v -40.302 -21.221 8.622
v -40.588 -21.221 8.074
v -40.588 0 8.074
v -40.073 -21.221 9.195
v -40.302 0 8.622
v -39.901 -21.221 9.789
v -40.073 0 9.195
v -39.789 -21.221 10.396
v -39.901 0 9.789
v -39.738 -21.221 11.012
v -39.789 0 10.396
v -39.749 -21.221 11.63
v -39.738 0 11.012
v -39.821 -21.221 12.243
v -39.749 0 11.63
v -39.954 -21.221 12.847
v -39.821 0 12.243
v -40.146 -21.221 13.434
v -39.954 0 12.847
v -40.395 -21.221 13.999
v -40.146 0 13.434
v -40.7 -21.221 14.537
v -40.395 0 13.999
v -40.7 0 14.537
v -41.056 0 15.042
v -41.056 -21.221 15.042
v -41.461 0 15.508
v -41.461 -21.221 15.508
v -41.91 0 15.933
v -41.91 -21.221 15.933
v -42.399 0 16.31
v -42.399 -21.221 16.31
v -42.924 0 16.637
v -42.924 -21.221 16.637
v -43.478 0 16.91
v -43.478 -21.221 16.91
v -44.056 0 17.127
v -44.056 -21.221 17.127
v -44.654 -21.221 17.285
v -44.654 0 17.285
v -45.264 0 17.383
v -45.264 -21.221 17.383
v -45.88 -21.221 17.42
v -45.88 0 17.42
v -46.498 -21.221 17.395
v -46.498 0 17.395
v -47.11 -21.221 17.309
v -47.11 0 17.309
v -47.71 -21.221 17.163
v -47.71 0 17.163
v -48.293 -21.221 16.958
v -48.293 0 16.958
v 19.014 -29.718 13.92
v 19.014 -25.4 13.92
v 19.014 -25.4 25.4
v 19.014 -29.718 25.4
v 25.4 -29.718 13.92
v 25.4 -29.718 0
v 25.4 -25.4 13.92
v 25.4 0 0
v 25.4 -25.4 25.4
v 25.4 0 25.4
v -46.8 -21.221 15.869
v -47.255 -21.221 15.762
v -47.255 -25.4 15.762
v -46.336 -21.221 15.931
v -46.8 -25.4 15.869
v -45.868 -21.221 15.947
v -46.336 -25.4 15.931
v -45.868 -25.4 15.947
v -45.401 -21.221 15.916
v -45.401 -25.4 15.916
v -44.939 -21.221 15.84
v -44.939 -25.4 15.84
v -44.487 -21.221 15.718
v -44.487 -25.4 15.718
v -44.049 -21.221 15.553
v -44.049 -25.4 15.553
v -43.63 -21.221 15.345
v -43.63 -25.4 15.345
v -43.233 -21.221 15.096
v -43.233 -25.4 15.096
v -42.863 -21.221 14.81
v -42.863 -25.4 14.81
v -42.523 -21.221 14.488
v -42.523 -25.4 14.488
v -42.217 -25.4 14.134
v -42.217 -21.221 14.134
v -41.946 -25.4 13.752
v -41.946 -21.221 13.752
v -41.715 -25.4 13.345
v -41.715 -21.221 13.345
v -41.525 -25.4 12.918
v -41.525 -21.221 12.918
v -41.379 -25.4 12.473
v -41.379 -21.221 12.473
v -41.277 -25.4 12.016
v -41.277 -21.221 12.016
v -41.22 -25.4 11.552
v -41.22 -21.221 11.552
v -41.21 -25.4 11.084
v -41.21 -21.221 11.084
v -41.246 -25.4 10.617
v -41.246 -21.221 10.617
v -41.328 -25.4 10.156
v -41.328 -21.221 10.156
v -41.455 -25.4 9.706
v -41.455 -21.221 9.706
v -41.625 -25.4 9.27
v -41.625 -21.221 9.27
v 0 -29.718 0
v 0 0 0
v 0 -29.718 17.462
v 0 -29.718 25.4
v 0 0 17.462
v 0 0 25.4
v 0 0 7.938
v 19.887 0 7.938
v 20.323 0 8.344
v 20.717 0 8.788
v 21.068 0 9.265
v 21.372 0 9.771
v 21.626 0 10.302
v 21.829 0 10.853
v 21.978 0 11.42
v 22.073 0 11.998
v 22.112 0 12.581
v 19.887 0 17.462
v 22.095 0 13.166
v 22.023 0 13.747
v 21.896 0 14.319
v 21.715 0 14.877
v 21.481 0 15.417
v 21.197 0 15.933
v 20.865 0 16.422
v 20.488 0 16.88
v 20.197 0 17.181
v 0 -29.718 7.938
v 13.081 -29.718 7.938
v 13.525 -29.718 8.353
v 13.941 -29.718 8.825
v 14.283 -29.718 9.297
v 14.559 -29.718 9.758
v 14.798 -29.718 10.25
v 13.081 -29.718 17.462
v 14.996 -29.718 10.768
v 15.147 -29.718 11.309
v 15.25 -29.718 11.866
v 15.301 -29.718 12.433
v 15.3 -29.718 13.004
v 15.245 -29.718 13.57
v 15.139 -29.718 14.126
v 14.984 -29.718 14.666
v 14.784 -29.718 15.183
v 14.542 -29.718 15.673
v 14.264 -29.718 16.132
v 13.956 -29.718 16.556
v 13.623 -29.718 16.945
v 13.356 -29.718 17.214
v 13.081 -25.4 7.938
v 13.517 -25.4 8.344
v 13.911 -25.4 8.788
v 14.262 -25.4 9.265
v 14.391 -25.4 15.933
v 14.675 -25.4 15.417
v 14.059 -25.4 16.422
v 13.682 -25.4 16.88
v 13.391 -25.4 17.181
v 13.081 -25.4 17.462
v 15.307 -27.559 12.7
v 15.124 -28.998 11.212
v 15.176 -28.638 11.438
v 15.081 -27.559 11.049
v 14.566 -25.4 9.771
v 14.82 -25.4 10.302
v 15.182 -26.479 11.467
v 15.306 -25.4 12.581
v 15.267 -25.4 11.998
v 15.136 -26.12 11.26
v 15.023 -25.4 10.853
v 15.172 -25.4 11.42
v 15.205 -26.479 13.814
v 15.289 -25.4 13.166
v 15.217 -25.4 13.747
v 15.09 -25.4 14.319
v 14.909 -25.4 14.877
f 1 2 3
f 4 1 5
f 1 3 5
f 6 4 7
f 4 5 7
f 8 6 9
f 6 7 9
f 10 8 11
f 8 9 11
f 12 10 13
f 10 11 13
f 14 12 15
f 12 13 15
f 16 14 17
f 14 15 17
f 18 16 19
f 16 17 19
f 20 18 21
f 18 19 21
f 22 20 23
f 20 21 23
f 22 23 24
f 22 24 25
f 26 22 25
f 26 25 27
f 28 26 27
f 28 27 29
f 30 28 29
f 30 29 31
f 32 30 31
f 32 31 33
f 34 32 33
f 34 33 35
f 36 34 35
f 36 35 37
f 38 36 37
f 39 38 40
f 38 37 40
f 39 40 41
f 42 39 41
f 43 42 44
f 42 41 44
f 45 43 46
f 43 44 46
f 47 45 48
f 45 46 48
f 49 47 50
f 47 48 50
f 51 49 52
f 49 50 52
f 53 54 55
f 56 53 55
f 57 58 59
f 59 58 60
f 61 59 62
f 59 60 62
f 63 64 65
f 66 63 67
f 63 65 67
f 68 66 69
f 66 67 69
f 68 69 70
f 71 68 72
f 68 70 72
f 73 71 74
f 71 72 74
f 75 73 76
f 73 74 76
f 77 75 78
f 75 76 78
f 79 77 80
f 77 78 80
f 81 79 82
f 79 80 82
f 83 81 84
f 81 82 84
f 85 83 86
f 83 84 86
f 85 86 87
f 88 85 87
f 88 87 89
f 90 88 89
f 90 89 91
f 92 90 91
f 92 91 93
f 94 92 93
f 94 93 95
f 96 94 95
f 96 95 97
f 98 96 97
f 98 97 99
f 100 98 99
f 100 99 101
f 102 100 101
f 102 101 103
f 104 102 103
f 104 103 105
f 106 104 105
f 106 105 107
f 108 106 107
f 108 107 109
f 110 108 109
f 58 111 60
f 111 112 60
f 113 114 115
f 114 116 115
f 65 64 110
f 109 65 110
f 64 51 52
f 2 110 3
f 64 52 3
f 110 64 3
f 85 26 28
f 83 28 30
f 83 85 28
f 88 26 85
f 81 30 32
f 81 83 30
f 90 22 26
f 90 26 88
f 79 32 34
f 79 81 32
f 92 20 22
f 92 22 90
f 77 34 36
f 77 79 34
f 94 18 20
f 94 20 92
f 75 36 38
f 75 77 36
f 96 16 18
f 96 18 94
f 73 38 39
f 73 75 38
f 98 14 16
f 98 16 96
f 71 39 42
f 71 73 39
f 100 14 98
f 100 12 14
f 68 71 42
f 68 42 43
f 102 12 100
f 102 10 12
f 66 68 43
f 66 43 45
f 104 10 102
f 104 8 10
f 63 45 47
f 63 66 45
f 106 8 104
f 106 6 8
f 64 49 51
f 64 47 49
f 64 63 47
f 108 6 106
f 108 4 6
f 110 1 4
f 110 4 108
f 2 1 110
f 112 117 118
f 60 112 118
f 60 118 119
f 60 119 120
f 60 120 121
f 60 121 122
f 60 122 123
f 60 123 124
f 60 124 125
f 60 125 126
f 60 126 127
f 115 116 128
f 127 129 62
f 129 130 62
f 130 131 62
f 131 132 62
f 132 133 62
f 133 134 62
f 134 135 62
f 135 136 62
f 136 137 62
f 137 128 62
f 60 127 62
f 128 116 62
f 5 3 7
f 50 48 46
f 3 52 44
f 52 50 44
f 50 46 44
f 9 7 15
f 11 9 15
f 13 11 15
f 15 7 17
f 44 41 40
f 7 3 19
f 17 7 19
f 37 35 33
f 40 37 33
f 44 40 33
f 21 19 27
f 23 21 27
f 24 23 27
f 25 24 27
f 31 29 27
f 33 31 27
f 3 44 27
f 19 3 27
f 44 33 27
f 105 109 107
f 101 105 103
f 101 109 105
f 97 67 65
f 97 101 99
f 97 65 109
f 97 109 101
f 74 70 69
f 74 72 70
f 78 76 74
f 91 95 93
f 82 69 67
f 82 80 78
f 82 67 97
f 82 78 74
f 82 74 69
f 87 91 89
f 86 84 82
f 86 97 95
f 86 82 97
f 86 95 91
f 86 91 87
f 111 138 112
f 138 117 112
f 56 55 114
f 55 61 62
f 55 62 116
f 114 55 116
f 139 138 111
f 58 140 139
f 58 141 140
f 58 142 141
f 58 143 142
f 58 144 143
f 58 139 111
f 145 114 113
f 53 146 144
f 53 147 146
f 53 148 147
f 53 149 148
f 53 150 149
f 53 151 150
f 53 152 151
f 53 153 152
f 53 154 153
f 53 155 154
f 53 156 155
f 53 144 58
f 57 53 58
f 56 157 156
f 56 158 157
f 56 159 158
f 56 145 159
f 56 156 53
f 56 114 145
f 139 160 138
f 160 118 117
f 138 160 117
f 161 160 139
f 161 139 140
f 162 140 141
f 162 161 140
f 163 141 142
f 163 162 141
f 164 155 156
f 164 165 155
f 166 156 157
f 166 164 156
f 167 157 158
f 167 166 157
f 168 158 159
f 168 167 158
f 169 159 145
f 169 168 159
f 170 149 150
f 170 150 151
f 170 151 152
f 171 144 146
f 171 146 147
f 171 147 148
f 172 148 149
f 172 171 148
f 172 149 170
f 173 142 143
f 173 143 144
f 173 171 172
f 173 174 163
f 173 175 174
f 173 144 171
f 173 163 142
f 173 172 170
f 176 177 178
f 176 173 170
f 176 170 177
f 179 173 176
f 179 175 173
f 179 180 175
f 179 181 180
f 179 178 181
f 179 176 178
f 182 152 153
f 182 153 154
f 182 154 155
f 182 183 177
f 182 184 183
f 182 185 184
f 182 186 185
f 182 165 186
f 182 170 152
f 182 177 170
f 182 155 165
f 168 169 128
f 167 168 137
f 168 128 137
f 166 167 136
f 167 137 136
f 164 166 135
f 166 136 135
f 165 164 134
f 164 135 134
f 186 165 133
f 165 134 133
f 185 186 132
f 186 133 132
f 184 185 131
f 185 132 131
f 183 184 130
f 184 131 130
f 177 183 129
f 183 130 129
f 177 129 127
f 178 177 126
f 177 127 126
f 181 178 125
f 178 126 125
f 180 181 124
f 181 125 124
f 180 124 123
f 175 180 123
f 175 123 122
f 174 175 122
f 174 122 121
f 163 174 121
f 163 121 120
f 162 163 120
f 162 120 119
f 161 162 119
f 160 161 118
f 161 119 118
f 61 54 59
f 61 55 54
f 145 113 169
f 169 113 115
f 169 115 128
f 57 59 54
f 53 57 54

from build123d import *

# Parameters (mm, degrees)
F0_W      = 25.4
F0_H      = 25.4
F1_DEPTH  = 25.4
F4_DEPTH  = 31.1095197333
F6_DEPTH  = 25.4
F8_W      = 1.4728852918
F8_H      = 4.1794891745
F11_DEPTH = 4.318


with BuildPart() as f1:
    # F0 (on Front) → F1 (new body)
    with BuildSketch(Plane.XZ):
        with Locations((12.7, 12.7)):
            Rectangle(F0_W, F0_H)
    extrude(amount=F1_DEPTH)

    # F3 (on face) → F4 (cut, through all)
    with BuildSketch(Plane(origin=(1.7014773719, 6.35, 0), x_dir=(-0.9659258263, 0.2588190451, 0), z_dir=(0.2588190451, 0.9659258263, 0))):
        with BuildLine():
            Line((0, 17.4625), (-19.2096461941, 17.4625))
            ThreePointArc((-19.2096461941, 17.4625), (-21.3595159877, 12.7), (-19.2096461941, 7.9375))
            Line((-19.2096461941, 7.9375), (0, 7.9375))
            Line((0, 7.9375), (0, 17.4625))
        make_face()
    extrude(amount=-F4_DEPTH, mode=Mode.SUBTRACT)

    # F10 (on face) → F11 (join)
    with BuildSketch(Plane.XZ.offset(25.4)):
        with BuildLine():
            Line((19.0142672509, 13.9198685065), (19.0142672509, 25.4))
            Line((19.0142672509, 25.4), (0, 25.4))
            Line((0, 25.4), (0, 17.4625))
            Line((0, 17.4625), (13.0813796511, 17.4625))
            add(Edge.make_bspline(
                [(13.0813796511, 7.9375), (18.6720443389, 12.7), (13.0813796511, 17.4625)],
                knots=[5.4351232282, 5.4351232282, 5.4351232282, 7.1312473862, 7.1312473862, 7.1312473862], degree=2, weights=[1, 0.6614378278, 1]))
            Line((13.0813796511, 7.9375), (0, 7.9375))
            Line((0, 7.9375), (0, 0))
            Line((0, 0), (25.4, 0))
            Line((25.4, 0), (25.4, 13.9198685065))
            Line((25.4, 13.9198685065), (19.0142672509, 13.9198685065))
        make_face()
    extrude(amount=F11_DEPTH)


with BuildPart() as f6:
    # F5 (on Front) → F6 (new body)
    with BuildSketch(Plane.XZ):
        with BuildLine():
            Line((-48.2925241717, 16.9579145359), (-40.5879244208, 8.0737629905))
            ThreePointArc((-40.5879244208, 8.0737629905), (-41.2528093466, 15.2800595559), (-48.2925241717, 16.9579145359))
        make_face()
    extrude(amount=F6_DEPTH)

    # F8 (on face) → F9 (revolve, cut)
    with BuildSketch(Plane(origin=(0, 0, 11.2136096217), x_dir=(1, 0, 0), z_dir=(0, 0, -1))):
        with Locations((-40.4715861474, 23.3102554128)):
            Rectangle(F8_W, F8_H)
    revolve(axis=Axis((-45.9418209286, 0, 11.2136096217), (0, 1, 0)), mode=Mode.SUBTRACT)


solid = Compound([f1.part, f6.part])
